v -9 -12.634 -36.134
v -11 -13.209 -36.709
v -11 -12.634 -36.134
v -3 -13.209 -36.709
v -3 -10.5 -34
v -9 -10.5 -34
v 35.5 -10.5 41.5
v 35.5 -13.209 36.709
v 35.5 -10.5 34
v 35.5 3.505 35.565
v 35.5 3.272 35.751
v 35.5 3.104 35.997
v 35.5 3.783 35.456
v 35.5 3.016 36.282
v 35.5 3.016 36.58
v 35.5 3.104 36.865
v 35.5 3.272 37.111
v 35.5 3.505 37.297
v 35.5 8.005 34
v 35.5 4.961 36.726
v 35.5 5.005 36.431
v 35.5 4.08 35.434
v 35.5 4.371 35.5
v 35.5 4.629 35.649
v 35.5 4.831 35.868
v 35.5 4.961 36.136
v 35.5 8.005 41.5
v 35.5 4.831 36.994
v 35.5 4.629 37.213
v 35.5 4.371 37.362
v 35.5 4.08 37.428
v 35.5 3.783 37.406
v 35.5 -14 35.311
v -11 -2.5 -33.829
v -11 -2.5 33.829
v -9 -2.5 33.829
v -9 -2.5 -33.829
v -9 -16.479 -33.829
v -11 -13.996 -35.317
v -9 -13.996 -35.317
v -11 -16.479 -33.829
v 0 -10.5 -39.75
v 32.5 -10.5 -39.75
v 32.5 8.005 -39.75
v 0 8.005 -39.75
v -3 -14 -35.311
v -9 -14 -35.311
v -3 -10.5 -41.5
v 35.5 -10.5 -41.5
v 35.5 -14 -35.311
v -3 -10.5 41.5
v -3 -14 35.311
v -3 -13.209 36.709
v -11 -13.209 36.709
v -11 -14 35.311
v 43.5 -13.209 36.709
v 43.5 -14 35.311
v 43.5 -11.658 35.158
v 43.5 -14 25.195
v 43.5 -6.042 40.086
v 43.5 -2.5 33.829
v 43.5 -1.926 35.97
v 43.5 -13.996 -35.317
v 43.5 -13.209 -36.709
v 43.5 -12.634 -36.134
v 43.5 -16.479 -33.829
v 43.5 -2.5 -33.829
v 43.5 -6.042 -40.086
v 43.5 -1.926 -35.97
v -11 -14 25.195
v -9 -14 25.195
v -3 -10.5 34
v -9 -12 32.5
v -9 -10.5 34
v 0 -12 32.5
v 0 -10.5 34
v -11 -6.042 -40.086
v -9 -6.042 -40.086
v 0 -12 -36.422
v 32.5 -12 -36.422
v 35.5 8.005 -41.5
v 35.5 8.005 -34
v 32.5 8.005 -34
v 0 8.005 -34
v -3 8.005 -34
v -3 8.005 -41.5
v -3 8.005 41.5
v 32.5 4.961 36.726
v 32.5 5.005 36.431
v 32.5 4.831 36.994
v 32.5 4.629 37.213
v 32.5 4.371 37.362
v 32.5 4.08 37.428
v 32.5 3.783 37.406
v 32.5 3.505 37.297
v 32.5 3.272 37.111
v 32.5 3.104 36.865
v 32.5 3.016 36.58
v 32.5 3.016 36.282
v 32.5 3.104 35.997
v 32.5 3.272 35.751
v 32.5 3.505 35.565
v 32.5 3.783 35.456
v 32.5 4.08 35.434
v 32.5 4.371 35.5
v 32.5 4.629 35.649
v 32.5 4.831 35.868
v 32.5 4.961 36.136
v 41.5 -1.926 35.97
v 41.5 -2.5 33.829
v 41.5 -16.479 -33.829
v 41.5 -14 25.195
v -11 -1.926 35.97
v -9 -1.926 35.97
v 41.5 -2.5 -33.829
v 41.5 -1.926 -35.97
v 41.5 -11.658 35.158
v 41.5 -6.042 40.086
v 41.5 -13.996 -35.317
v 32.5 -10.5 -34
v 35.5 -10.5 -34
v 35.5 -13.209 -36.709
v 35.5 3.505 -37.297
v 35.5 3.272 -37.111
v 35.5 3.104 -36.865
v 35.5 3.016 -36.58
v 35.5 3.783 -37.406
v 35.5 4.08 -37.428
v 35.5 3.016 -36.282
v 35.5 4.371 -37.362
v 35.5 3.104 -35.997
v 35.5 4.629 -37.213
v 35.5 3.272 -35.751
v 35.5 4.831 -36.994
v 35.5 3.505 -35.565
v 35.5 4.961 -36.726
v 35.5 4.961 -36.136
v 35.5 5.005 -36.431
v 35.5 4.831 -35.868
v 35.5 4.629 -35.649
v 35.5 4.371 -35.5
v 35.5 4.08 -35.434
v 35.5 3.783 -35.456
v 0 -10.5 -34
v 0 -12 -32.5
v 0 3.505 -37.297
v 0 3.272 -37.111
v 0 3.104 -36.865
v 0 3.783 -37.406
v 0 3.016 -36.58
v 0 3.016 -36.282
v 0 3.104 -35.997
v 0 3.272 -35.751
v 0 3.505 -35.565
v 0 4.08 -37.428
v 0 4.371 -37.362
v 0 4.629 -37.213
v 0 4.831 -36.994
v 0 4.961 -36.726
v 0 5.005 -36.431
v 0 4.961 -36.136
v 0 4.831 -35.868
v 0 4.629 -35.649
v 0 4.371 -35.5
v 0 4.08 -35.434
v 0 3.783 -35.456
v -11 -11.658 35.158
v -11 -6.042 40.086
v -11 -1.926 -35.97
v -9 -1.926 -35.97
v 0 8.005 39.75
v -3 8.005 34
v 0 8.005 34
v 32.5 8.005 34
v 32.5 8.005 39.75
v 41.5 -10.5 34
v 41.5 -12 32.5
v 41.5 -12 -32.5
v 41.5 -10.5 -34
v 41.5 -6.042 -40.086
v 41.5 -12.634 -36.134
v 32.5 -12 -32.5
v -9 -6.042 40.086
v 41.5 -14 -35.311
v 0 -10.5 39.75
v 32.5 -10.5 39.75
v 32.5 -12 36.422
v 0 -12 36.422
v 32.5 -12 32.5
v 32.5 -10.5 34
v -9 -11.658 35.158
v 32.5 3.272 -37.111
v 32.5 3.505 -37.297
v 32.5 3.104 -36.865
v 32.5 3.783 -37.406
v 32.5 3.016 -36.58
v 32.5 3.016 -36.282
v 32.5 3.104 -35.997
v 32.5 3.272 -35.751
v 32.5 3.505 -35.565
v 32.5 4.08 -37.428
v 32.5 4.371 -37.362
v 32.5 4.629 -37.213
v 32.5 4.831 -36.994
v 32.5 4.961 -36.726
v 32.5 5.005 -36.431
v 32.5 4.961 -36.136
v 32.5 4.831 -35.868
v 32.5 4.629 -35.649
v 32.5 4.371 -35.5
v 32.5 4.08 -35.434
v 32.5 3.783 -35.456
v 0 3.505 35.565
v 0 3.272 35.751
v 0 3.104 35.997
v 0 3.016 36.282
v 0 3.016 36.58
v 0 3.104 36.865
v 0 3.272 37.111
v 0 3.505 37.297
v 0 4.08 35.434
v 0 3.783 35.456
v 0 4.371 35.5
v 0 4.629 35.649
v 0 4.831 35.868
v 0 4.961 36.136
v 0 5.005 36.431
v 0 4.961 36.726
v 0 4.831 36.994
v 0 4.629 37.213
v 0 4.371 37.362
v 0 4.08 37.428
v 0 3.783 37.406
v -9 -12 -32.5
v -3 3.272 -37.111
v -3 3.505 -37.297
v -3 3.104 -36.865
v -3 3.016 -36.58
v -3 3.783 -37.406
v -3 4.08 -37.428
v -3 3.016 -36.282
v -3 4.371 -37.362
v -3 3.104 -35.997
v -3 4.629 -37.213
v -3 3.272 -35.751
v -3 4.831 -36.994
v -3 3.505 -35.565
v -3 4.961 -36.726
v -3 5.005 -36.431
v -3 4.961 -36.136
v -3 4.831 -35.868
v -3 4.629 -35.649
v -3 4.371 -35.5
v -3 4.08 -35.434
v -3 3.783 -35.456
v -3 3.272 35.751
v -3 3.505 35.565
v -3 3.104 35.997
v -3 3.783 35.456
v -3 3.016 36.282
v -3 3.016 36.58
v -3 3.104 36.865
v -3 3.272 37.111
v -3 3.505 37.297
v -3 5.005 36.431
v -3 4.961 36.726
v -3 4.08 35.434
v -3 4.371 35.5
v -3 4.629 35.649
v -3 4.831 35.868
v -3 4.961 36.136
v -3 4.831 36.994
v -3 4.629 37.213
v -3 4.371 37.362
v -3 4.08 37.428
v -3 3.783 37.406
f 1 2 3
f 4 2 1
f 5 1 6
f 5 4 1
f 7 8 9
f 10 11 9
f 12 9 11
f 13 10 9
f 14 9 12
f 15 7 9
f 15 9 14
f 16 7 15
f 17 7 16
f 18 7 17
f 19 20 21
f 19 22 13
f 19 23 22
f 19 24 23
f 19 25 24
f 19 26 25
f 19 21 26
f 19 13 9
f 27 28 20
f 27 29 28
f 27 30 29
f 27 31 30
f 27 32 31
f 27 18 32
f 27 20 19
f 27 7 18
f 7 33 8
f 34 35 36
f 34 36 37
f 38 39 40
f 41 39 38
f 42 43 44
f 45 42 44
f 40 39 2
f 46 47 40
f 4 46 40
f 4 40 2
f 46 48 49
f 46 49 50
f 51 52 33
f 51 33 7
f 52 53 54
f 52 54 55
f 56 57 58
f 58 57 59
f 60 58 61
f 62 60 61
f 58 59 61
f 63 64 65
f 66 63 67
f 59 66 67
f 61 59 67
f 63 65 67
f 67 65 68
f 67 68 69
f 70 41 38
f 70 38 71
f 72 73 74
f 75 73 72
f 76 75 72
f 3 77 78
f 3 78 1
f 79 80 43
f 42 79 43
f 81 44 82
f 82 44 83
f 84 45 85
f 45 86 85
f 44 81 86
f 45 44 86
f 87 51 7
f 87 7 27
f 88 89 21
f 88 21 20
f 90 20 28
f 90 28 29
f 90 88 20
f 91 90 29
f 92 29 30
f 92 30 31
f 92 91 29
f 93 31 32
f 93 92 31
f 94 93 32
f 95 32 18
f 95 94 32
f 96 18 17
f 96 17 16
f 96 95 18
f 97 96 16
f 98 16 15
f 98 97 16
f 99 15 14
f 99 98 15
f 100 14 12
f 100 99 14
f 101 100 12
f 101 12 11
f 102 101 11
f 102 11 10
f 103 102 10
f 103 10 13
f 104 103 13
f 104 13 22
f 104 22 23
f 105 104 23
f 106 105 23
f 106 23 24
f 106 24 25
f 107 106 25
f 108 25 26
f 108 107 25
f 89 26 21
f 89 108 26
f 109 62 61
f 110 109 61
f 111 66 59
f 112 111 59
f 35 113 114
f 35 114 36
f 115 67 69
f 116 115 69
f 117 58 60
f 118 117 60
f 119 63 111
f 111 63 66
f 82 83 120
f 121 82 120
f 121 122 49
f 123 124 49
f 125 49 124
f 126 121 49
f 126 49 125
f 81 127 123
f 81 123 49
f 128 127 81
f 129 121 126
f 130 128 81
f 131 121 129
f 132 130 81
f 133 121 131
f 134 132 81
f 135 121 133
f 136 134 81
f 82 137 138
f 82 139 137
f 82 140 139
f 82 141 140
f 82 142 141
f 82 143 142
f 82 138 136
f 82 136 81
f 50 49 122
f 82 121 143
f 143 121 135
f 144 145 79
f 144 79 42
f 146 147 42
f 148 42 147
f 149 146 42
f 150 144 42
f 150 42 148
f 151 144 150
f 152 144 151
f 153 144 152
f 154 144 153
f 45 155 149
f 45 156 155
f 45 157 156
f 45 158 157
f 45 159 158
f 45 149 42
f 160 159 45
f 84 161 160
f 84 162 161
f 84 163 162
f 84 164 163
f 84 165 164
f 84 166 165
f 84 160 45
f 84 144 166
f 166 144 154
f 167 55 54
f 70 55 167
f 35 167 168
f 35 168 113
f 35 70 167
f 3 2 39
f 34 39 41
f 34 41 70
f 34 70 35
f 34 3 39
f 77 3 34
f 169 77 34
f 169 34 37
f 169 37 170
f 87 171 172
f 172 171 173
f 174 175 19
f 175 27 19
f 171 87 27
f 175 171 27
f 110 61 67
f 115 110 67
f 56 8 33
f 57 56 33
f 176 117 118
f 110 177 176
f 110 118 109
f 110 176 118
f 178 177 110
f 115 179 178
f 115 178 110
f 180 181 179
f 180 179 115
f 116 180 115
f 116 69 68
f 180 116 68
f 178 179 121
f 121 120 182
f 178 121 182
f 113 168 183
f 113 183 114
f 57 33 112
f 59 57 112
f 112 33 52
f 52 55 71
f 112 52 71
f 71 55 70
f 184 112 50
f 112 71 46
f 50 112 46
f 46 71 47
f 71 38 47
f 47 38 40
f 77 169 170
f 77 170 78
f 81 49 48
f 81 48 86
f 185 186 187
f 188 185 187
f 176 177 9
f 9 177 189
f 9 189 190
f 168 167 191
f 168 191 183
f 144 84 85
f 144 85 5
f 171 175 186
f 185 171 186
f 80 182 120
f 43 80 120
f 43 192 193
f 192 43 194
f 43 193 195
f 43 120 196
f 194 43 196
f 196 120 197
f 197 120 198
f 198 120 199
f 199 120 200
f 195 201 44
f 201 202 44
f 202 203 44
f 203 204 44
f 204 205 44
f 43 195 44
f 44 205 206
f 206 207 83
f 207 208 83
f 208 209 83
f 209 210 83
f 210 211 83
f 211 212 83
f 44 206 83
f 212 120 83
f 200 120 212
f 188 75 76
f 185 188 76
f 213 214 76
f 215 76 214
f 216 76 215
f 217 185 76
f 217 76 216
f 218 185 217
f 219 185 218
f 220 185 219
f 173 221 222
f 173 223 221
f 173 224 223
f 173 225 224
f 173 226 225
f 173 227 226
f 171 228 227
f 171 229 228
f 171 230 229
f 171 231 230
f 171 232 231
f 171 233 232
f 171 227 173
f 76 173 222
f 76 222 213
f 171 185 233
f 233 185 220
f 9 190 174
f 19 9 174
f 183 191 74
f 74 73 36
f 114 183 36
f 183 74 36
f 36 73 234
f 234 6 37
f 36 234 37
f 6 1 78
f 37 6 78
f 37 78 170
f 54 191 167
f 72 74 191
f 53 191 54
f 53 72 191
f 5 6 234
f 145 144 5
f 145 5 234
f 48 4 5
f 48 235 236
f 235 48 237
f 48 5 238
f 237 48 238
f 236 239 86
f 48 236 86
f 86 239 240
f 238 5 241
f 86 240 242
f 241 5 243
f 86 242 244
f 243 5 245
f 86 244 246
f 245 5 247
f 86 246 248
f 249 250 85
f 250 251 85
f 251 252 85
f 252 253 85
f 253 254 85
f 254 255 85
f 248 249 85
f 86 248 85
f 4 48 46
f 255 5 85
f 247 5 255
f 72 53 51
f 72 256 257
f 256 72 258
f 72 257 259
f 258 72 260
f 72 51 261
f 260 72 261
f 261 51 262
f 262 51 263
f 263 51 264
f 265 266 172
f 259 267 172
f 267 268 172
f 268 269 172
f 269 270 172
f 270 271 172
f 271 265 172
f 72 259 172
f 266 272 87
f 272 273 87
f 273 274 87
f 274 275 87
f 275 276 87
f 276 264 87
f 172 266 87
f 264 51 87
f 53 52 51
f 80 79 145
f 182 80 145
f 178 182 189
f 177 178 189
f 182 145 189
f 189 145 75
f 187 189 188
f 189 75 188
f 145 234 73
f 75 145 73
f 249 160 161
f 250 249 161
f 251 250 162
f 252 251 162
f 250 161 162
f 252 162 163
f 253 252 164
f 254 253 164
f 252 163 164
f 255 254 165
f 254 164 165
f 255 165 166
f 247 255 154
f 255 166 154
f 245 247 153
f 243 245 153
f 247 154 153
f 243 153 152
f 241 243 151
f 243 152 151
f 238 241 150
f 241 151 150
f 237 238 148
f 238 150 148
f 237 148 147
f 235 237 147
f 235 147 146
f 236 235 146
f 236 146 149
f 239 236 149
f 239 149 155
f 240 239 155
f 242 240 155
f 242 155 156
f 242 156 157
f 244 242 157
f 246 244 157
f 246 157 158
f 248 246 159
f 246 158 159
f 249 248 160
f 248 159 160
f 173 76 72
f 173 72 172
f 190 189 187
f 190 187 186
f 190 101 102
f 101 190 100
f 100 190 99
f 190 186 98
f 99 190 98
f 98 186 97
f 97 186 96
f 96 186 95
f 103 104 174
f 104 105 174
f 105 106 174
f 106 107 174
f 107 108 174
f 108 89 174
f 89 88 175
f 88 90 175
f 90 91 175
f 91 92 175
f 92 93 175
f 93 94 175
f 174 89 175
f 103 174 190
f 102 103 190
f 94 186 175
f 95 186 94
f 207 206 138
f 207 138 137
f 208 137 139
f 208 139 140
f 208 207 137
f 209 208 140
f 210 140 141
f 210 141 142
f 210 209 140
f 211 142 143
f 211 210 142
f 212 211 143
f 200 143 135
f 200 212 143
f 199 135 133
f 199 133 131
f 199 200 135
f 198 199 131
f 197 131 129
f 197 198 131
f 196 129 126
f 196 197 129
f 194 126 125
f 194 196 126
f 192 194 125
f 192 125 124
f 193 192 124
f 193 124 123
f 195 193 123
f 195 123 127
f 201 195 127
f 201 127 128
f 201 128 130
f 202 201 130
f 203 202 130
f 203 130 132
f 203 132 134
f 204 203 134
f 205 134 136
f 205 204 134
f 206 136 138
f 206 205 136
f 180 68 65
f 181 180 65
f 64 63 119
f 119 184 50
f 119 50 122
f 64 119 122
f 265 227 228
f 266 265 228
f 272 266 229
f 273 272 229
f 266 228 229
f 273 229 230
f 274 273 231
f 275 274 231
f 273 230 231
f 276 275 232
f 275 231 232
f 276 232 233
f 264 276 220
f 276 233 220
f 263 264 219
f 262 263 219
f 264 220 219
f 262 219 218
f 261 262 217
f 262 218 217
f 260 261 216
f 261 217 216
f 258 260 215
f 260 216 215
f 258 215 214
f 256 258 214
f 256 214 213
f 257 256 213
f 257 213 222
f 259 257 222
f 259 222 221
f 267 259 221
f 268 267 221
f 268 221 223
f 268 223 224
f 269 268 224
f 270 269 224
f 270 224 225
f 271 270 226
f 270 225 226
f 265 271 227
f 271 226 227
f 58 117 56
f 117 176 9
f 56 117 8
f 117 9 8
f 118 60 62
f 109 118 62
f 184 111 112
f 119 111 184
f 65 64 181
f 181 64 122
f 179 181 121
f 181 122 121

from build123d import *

# Parameters (mm, degrees)
SKETCH_R     = 1
PAD_DEPTH    = 3
PAD001_DEPTH = 16.25
PAD002_DEPTH = 8
PAD003_DEPTH = 2


with BuildPart() as part:
    # Sketch → Pad (new body)
    with BuildSketch(Plane.YZ):
        Polygon((8.005182, 34), (8.005182, 41.5), (-10.5, 41.5), (-14, 35.310526), (-14, -35.310526), (-10.5, -41.5), (8.005182, -41.5), (8.005182, -34), (-10.5, -34), (-12, -32.5), (-12, 32.5), (-10.5, 34), align=None)
        with Locations((4.005182, 36.430913)):
            Circle(SKETCH_R, mode=Mode.SUBTRACT)
        with Locations((4.005182, -36.430913)):
            Circle(SKETCH_R, mode=Mode.SUBTRACT)
    pad = extrude(amount=-PAD_DEPTH)

    # Sketch002 (on Face15 of Pad) → Pad001 (join)
    with BuildSketch(Plane.YZ):
        Polygon((-10.5, 41.5), (8.005182, 41.5), (8.005182, 39.75), (-10.5, 39.75), (-12, 36.422085), (-12, -36.422085), (-10.5, -39.75), (8.005182, -39.75), (8.005182, -41.5), (-10.5, -41.5), (-14, -35.310526), (-14, 35.310526), align=None)
    pad001 = extrude(amount=PAD001_DEPTH)

    # Sketch003 (on Face6 of Pad001) → Pad002 (join)
    with BuildSketch(Plane(origin=(-3, 0, 0), x_dir=(0, 1, 0), z_dir=(-1, 0, 0))):
        Polygon((-12, 32.5), (-12, -32.5), (-10.5, -34), (-13.209125, -36.709125), (-14, -35.310526), (-14, 35.310526), (-13.209125, 36.709125), (-10.5, 34), align=None)
    pad002 = extrude(amount=PAD002_DEPTH)

    # Sketch004 (on Face28 of Pad002) → Pad003 (join)
    with BuildSketch(Plane(origin=(-11, 0, 0), x_dir=(0, 1, 0), z_dir=(-1, 0, 0))):
        Polygon((-6.041631, 40.085786), (-16.478994, 33.828846), (-13.655174, -33.40501), (-6.041631, -40.085786), (-1.926248, -35.970404), (-2.5, -33.829131), (-2.5, 33.829131), (-1.926248, 35.970404), align=None)
    pad003 = extrude(amount=-PAD003_DEPTH)

    # Mirrored: Pad, Pad001, Pad002, Pad003 across face of Pad003
    add(pad.mirror(Plane(origin=(16.25, -9.470165, 0), x_dir=(0, 1, 0), z_dir=(1, 0, 0))))
    add(pad001.mirror(Plane(origin=(16.25, -9.470165, 0), x_dir=(0, 1, 0), z_dir=(1, 0, 0))))
    add(pad002.mirror(Plane(origin=(16.25, -9.470165, 0), x_dir=(0, 1, 0), z_dir=(1, 0, 0))))
    add(pad003.mirror(Plane(origin=(16.25, -9.470165, 0), x_dir=(0, 1, 0), z_dir=(1, 0, 0))))


solid = part.part
